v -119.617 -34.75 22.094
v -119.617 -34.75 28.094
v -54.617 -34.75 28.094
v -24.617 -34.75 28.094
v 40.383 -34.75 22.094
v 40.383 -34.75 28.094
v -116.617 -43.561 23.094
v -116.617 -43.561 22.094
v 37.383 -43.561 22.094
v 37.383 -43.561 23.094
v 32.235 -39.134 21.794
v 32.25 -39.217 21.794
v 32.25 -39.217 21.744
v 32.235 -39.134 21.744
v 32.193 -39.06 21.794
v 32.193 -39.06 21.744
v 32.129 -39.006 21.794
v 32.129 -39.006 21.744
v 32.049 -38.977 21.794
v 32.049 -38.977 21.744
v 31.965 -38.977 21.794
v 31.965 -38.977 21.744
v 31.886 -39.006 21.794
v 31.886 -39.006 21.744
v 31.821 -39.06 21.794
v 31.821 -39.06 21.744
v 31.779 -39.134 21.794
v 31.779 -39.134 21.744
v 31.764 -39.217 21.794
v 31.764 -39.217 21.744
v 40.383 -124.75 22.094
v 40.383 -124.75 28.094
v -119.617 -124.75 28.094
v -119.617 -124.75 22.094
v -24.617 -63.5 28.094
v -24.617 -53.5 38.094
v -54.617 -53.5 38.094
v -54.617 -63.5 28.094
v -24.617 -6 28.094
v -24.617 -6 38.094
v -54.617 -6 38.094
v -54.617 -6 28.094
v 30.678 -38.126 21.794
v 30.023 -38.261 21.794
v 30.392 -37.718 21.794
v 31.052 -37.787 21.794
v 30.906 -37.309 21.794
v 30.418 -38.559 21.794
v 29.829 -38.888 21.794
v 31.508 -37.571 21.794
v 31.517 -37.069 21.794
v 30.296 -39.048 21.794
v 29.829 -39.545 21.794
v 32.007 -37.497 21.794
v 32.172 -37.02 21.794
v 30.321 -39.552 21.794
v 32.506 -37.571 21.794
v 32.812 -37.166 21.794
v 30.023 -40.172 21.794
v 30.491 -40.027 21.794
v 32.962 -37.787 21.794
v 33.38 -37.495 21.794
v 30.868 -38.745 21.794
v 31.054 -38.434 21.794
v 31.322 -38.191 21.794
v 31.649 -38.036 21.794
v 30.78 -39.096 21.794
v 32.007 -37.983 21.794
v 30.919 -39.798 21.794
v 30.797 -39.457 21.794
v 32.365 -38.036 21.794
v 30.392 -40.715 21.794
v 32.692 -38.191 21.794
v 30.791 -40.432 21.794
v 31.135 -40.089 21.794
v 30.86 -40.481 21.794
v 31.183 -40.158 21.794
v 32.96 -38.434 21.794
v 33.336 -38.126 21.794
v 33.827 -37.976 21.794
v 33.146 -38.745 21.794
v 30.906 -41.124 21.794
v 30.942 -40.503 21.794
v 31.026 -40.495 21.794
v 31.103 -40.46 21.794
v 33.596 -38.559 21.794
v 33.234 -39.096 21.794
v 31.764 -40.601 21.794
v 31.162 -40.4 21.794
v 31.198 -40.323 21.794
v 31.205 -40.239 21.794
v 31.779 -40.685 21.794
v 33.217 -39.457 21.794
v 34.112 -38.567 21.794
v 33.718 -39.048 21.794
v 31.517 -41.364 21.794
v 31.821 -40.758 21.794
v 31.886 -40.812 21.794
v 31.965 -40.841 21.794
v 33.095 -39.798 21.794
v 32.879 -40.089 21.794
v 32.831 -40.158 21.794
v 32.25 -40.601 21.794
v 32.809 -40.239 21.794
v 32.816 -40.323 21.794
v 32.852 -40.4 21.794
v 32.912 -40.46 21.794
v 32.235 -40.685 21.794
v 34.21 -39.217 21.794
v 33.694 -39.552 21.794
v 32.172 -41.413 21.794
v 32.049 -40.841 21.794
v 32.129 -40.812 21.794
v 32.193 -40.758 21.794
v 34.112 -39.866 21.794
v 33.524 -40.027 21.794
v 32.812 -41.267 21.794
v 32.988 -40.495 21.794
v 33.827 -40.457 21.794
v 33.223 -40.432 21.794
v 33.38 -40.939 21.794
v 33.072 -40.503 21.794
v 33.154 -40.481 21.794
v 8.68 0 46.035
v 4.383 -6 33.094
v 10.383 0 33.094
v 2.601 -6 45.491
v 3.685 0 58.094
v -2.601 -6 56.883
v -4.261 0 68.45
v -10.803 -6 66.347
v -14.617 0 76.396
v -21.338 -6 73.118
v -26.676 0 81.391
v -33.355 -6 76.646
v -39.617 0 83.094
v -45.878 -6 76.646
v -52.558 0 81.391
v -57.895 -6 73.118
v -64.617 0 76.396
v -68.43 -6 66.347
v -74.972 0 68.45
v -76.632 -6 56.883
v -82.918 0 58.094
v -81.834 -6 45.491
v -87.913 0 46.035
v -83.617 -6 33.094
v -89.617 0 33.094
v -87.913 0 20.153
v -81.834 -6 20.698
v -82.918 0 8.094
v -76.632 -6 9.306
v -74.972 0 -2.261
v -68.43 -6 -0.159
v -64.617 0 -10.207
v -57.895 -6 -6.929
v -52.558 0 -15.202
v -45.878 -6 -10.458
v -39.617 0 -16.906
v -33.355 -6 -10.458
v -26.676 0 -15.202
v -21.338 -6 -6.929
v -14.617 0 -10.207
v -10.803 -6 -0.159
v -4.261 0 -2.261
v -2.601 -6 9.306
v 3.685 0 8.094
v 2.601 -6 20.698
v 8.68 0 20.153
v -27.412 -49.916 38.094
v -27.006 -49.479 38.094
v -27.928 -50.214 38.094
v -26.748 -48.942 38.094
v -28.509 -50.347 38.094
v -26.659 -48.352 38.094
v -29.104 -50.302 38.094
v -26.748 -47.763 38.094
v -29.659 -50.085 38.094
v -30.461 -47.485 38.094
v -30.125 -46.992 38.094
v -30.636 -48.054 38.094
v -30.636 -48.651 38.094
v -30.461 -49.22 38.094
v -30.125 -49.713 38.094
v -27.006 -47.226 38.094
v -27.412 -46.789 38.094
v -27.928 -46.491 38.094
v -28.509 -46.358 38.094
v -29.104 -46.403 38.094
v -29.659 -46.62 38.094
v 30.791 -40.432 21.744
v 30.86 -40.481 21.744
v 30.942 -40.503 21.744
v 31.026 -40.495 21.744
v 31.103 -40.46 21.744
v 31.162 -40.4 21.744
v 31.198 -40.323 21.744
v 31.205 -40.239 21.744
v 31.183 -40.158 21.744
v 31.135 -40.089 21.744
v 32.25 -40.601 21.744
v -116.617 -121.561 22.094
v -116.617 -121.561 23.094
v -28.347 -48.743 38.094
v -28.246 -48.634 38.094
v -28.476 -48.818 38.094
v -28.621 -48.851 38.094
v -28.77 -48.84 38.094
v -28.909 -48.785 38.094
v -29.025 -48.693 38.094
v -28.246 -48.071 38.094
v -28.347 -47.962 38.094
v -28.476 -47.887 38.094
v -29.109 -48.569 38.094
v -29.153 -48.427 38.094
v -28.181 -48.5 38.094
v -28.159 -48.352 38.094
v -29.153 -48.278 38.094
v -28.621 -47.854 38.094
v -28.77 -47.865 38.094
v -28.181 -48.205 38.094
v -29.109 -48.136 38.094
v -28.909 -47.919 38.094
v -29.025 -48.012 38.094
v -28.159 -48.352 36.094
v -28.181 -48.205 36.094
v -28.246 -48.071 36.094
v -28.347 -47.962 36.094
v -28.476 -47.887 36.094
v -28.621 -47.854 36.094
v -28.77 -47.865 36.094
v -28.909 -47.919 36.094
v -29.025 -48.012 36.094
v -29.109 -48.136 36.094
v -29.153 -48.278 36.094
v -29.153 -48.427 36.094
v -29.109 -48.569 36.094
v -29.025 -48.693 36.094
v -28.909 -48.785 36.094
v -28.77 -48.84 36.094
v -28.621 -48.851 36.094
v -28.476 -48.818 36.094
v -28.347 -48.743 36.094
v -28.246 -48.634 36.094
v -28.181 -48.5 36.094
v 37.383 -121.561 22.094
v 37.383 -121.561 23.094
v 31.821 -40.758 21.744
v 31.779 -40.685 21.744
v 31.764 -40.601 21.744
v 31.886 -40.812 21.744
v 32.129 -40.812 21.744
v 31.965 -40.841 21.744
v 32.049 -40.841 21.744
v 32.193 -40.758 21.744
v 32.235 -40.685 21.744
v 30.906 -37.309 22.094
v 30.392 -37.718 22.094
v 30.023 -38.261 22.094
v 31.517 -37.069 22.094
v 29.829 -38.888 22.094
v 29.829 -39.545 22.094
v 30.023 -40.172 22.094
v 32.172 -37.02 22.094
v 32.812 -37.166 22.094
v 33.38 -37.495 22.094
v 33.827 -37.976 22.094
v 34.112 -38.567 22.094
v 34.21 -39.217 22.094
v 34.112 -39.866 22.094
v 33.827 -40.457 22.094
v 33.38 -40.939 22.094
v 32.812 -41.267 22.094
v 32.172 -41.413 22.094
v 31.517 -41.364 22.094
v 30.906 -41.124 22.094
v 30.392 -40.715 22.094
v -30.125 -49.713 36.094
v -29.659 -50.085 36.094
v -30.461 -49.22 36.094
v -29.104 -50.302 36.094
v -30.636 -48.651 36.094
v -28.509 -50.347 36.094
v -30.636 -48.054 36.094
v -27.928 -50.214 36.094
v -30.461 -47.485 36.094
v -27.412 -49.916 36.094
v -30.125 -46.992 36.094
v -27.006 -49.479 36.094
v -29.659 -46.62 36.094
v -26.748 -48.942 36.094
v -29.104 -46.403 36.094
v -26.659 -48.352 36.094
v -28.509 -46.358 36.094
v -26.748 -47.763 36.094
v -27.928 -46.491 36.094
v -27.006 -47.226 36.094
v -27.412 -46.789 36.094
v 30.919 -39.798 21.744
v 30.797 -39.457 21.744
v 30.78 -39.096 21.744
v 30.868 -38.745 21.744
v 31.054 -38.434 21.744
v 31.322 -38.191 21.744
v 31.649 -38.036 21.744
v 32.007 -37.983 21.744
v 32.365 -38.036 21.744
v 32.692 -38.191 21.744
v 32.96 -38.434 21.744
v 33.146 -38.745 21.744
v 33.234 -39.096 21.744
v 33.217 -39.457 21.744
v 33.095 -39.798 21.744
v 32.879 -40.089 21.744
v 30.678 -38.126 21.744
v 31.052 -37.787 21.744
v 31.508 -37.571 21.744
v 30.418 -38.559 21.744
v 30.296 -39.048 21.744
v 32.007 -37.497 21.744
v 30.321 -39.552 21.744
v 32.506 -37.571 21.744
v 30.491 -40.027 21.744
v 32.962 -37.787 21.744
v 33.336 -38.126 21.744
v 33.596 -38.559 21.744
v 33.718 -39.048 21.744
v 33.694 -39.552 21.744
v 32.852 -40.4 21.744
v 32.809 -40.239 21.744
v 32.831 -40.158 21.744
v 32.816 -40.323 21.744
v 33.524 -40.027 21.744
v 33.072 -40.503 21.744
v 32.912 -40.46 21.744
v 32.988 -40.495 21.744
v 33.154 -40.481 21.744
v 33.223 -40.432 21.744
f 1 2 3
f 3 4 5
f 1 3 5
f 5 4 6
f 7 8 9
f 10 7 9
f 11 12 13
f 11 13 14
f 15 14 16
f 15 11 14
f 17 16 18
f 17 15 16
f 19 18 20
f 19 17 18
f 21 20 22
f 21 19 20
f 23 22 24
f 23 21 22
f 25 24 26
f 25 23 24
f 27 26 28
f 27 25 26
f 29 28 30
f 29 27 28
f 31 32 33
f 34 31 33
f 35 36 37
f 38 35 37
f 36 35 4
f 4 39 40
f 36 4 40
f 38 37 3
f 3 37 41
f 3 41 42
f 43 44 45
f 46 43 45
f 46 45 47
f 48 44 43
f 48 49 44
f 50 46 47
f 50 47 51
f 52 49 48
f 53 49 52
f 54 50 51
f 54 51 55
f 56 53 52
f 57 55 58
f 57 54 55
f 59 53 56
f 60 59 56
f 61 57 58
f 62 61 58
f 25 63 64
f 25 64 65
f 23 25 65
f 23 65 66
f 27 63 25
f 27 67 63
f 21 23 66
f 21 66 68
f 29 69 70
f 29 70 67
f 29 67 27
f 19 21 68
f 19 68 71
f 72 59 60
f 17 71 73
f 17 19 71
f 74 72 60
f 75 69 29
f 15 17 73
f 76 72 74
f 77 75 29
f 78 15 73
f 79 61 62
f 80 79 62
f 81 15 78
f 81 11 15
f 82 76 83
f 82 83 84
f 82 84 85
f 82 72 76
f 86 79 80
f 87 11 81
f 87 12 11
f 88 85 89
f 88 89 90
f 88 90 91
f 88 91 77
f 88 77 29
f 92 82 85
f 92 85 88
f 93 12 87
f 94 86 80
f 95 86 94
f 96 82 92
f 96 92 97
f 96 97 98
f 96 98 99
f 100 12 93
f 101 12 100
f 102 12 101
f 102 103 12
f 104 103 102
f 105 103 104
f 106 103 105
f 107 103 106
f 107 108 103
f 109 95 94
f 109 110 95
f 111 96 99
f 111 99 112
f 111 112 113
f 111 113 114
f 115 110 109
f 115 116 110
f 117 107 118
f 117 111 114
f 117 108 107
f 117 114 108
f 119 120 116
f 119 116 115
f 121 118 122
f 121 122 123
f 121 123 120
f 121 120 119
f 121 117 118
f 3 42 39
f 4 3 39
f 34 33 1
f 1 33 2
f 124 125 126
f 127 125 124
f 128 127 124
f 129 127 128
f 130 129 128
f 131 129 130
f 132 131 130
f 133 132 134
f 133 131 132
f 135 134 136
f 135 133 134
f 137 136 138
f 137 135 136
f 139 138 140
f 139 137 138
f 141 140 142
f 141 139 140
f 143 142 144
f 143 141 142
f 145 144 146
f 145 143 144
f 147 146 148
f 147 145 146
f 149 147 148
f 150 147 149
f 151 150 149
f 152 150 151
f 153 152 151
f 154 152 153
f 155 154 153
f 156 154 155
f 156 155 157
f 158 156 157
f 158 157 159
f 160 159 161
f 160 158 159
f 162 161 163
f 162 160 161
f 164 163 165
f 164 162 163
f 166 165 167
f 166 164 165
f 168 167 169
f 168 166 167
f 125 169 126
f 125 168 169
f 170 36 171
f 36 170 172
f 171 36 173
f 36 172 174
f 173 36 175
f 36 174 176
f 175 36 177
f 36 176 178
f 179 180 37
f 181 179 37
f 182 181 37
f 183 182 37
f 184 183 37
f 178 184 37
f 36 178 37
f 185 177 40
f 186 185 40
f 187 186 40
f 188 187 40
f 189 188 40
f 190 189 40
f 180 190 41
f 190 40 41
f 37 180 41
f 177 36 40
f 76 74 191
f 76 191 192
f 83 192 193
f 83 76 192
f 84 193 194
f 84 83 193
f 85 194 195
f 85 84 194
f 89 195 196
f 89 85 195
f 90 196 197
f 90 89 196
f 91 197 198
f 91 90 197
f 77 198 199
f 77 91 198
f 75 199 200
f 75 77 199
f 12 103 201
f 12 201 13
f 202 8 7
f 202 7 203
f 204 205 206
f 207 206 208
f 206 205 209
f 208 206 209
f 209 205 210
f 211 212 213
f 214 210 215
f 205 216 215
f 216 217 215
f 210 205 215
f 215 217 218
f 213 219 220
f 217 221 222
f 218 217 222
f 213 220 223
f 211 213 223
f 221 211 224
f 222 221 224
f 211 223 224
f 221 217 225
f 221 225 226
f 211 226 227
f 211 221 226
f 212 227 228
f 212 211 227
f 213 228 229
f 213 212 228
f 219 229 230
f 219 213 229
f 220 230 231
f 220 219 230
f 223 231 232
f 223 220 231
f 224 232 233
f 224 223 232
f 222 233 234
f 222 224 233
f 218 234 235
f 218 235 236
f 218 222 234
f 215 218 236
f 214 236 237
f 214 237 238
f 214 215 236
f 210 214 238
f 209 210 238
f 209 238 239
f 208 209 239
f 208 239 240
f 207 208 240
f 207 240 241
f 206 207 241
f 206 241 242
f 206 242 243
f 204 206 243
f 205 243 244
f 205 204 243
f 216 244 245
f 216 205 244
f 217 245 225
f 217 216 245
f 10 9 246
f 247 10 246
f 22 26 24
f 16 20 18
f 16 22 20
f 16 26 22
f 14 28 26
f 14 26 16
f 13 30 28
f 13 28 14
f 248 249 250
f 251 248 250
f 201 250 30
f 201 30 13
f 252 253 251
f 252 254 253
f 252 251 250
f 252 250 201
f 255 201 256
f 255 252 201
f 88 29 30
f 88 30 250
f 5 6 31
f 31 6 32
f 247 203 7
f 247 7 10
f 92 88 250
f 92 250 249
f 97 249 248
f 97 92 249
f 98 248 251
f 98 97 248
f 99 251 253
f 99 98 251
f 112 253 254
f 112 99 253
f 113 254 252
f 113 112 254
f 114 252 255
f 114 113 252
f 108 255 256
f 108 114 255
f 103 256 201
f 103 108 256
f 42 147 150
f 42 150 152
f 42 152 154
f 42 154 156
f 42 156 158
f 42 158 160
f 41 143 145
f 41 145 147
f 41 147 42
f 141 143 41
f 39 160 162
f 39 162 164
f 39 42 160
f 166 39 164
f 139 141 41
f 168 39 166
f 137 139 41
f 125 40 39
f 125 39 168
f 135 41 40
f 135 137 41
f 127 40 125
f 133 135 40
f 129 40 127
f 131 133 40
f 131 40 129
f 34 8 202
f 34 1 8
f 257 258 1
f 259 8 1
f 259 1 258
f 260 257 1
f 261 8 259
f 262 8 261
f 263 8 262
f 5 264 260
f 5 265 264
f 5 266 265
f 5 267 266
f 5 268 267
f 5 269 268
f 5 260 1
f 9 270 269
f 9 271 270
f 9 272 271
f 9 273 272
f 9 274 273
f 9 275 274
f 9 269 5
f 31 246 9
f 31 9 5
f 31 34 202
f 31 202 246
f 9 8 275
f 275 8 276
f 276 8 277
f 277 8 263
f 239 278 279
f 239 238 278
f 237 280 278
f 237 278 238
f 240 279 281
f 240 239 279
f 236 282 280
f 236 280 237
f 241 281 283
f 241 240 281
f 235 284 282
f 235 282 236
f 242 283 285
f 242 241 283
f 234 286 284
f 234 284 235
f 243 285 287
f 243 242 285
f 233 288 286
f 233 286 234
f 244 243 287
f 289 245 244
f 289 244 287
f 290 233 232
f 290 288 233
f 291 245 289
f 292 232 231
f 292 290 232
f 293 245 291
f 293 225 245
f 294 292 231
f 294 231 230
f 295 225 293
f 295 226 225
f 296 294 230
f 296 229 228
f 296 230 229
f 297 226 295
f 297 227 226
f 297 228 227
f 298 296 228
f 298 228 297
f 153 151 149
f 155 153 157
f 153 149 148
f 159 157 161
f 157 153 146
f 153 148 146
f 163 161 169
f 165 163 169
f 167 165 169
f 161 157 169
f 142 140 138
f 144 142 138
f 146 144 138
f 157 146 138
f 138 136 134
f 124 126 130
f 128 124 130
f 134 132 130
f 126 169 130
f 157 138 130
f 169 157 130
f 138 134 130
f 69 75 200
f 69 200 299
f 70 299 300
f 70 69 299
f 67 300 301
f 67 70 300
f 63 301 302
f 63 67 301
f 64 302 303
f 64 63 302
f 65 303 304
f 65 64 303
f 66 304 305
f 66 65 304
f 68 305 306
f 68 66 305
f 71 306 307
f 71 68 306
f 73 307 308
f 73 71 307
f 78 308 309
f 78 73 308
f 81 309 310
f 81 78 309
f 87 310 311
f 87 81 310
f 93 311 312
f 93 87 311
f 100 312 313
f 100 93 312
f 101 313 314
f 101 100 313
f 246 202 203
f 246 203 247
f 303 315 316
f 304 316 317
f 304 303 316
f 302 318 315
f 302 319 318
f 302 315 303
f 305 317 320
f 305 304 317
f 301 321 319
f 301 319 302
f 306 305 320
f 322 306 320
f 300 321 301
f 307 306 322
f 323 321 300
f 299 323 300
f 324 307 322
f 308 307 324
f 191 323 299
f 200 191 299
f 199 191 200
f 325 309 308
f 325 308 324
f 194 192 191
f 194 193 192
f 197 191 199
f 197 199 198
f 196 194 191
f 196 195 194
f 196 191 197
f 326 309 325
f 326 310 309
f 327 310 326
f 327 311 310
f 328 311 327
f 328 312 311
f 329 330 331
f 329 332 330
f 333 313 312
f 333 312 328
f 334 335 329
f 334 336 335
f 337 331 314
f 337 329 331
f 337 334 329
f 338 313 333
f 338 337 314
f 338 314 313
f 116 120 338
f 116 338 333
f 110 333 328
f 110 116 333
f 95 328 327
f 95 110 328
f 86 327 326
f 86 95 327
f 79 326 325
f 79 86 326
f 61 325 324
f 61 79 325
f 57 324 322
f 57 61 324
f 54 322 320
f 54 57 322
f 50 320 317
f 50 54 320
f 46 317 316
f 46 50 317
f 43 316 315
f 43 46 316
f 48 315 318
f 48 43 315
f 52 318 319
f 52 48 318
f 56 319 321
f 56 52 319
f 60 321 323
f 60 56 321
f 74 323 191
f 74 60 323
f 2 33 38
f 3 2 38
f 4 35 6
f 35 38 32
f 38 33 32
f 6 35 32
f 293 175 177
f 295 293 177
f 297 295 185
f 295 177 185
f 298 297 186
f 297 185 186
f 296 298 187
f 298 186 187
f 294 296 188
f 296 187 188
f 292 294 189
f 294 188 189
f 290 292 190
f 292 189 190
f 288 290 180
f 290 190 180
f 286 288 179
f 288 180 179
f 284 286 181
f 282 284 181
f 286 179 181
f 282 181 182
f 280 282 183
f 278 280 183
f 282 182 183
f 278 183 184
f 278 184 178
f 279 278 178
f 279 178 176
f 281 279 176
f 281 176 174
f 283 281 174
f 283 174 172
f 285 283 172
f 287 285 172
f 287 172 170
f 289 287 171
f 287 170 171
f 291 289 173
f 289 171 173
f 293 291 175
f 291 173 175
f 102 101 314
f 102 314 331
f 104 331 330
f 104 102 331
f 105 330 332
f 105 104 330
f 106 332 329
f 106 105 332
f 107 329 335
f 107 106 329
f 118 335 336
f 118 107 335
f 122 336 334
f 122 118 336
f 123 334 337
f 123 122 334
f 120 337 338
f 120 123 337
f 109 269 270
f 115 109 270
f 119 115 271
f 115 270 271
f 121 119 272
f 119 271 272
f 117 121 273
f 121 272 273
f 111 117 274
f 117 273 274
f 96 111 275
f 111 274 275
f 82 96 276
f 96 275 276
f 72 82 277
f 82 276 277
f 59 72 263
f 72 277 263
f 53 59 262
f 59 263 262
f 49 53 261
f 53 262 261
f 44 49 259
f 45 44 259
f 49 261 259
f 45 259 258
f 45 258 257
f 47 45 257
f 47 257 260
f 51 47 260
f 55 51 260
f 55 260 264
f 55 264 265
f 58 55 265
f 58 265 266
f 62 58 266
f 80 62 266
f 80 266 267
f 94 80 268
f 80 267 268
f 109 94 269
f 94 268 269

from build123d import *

# Parameters (mm, degrees)
F0_R      = 50
F1_DEPTH  = 6
F2_SIZE   = 5.99999
F4_DEPTH  = 57.5
F5_W      = 15
F5_H      = 28.75
F6_DEPTH  = 6
F7_W      = 154
F7_H      = 78
F8_DEPTH  = 1
F9_SIZE   = 9.99999
F10_R     = 2.2025754481
F11_DEPTH = 0.3
F12_DEPTH = 0.35
F13_R     = 2
F13_R_2   = 0.5
F14_DEPTH = 2


# Not quite as in the source:
# - a fillet or chamfer is up to 0.001 mm smaller than in the source, because OpenCascade refuses the exact size


with BuildPart() as f1:
    # F0 (on Front) → F1 (new body)
    with BuildSketch(Plane.XZ):
        with Locations((-39.6165661514, 33.0943278968)):
            Circle(F0_R)
    extrude(amount=F1_DEPTH)

    # F2 (size 6 in the source; OpenCascade refuses exactly that, so slightly less here)
    f2_edges = [f1.edges().sort_by_distance(p)[0] for p in [
        (-89.616566, -6, 33.094328),
    ]]
    chamfer(f2_edges, length=F2_SIZE)

    # F3 (on face) → F4 (join)
    with BuildSketch(Plane.XZ.offset(6)):
        Polygon((-54.6165661514, 28.0943278968), (-39.6165661514, 28.0943278968), (-24.6165661514, 28.0943278968), (-24.6165661514, 38.0943278968), (-39.6165661514, 38.0943278968), (-54.6165661514, 38.0943278968), align=None)
    extrude(amount=F4_DEPTH)

    # F5 (on face) → F6 (join)
    with BuildSketch(Plane(origin=(0, 0, 28.0943278968), x_dir=(1, 0, 0), z_dir=(0, 0, -1))):
        Polygon((-119.6165661514, 34.75), (-54.6165661514, 34.75), (-54.6165661514, 63.5), (-39.6165661514, 63.5), (-24.6165661514, 63.5), (-24.6165661514, 34.75), (40.3834338486, 34.75), (40.3834338486, 124.75), (-39.6165661514, 124.75), (-119.6165661514, 124.75), align=None)
        with Locations((-32.1165661514, 49.125)):
            Rectangle(F5_W, F5_H)
        with Locations((-47.1165661514, 49.125)):
            Rectangle(F5_W, F5_H)
    extrude(amount=F6_DEPTH)

    # F7 (on face) → F8 (cut)
    with BuildSketch(Plane(origin=(0, 0, 22.0943278968), x_dir=(1, 0, 0), z_dir=(0, 0, -1))):
        with Locations((-39.6165661514, 82.5612554252)):
            Rectangle(F7_W, F7_H)
    extrude(amount=-F8_DEPTH, mode=Mode.SUBTRACT)

    # F9 (size 10 in the source; OpenCascade refuses exactly that, so slightly less here)
    f9_edges = [f1.edges().sort_by_distance(p)[0] for p in [
        (-39.616566, -63.5, 38.094328),
    ]]
    chamfer(f9_edges, length=F9_SIZE)

    # F10 (on face) → F11 (join)
    with BuildSketch(Plane(origin=(0, 0, 22.0943278968), x_dir=(1, 0, 0), z_dir=(0, 0, -1))):
        with Locations((32.0070236921, 39.2166003585)):
            Circle(F10_R)
        with BuildLine():
            ThreePointArc((33.2229098133, 40.4324864797), (32.0070236921, 37.4970777156), (30.7911375709, 40.4324864797))
            ThreePointArc((30.7911375709, 40.4324864797), (31.1349833923, 40.4324864797), (31.1349833923, 40.0886406584))
            ThreePointArc((31.1349833923, 40.0886406584), (32.0070236921, 37.9833491395), (32.879063992, 40.0886406584))
            ThreePointArc((32.879063992, 40.0886406584), (32.879063992, 40.4324864797), (33.2229098133, 40.4324864797))
        make_face(mode=Mode.SUBTRACT)
        with BuildLine():
            ThreePointArc((32.2499889227, 39.2166003585), (32.0070236921, 38.9736351279), (31.7640584616, 39.2166003585))
            Line((31.7640584616, 39.2166003585), (31.7640584616, 40.6014584005))
            ThreePointArc((31.7640584616, 40.6014584005), (32.0070236921, 40.844423631), (32.2499889227, 40.6014584005))
            Line((32.2499889227, 40.6014584005), (32.2499889227, 39.2166003585))
        make_face(mode=Mode.SUBTRACT)
    extrude(amount=F11_DEPTH)

    # F12 (add): faces of the model
    f12_faces = [f1.faces().sort_by_distance(p)[0] for p in [
        (32.0070236921, -39.9090293795, 22.0943278968),
        (32.0070236921, -37.5427579145, 22.0943278968),
    ]]
    extrude(f12_faces, amount=F12_DEPTH)

    # F13 (on face) → F14 (cut)
    with BuildSketch(Plane.XY.offset(38.0943278968)):
        with Locations((-28.6587122828, -48.3524724841)):
            Circle(F13_R)
        with Locations((-28.6587122828, -48.3524724841)):
            Circle(F13_R_2, mode=Mode.SUBTRACT)
    extrude(amount=-F14_DEPTH, mode=Mode.SUBTRACT)


solid = f1.part
